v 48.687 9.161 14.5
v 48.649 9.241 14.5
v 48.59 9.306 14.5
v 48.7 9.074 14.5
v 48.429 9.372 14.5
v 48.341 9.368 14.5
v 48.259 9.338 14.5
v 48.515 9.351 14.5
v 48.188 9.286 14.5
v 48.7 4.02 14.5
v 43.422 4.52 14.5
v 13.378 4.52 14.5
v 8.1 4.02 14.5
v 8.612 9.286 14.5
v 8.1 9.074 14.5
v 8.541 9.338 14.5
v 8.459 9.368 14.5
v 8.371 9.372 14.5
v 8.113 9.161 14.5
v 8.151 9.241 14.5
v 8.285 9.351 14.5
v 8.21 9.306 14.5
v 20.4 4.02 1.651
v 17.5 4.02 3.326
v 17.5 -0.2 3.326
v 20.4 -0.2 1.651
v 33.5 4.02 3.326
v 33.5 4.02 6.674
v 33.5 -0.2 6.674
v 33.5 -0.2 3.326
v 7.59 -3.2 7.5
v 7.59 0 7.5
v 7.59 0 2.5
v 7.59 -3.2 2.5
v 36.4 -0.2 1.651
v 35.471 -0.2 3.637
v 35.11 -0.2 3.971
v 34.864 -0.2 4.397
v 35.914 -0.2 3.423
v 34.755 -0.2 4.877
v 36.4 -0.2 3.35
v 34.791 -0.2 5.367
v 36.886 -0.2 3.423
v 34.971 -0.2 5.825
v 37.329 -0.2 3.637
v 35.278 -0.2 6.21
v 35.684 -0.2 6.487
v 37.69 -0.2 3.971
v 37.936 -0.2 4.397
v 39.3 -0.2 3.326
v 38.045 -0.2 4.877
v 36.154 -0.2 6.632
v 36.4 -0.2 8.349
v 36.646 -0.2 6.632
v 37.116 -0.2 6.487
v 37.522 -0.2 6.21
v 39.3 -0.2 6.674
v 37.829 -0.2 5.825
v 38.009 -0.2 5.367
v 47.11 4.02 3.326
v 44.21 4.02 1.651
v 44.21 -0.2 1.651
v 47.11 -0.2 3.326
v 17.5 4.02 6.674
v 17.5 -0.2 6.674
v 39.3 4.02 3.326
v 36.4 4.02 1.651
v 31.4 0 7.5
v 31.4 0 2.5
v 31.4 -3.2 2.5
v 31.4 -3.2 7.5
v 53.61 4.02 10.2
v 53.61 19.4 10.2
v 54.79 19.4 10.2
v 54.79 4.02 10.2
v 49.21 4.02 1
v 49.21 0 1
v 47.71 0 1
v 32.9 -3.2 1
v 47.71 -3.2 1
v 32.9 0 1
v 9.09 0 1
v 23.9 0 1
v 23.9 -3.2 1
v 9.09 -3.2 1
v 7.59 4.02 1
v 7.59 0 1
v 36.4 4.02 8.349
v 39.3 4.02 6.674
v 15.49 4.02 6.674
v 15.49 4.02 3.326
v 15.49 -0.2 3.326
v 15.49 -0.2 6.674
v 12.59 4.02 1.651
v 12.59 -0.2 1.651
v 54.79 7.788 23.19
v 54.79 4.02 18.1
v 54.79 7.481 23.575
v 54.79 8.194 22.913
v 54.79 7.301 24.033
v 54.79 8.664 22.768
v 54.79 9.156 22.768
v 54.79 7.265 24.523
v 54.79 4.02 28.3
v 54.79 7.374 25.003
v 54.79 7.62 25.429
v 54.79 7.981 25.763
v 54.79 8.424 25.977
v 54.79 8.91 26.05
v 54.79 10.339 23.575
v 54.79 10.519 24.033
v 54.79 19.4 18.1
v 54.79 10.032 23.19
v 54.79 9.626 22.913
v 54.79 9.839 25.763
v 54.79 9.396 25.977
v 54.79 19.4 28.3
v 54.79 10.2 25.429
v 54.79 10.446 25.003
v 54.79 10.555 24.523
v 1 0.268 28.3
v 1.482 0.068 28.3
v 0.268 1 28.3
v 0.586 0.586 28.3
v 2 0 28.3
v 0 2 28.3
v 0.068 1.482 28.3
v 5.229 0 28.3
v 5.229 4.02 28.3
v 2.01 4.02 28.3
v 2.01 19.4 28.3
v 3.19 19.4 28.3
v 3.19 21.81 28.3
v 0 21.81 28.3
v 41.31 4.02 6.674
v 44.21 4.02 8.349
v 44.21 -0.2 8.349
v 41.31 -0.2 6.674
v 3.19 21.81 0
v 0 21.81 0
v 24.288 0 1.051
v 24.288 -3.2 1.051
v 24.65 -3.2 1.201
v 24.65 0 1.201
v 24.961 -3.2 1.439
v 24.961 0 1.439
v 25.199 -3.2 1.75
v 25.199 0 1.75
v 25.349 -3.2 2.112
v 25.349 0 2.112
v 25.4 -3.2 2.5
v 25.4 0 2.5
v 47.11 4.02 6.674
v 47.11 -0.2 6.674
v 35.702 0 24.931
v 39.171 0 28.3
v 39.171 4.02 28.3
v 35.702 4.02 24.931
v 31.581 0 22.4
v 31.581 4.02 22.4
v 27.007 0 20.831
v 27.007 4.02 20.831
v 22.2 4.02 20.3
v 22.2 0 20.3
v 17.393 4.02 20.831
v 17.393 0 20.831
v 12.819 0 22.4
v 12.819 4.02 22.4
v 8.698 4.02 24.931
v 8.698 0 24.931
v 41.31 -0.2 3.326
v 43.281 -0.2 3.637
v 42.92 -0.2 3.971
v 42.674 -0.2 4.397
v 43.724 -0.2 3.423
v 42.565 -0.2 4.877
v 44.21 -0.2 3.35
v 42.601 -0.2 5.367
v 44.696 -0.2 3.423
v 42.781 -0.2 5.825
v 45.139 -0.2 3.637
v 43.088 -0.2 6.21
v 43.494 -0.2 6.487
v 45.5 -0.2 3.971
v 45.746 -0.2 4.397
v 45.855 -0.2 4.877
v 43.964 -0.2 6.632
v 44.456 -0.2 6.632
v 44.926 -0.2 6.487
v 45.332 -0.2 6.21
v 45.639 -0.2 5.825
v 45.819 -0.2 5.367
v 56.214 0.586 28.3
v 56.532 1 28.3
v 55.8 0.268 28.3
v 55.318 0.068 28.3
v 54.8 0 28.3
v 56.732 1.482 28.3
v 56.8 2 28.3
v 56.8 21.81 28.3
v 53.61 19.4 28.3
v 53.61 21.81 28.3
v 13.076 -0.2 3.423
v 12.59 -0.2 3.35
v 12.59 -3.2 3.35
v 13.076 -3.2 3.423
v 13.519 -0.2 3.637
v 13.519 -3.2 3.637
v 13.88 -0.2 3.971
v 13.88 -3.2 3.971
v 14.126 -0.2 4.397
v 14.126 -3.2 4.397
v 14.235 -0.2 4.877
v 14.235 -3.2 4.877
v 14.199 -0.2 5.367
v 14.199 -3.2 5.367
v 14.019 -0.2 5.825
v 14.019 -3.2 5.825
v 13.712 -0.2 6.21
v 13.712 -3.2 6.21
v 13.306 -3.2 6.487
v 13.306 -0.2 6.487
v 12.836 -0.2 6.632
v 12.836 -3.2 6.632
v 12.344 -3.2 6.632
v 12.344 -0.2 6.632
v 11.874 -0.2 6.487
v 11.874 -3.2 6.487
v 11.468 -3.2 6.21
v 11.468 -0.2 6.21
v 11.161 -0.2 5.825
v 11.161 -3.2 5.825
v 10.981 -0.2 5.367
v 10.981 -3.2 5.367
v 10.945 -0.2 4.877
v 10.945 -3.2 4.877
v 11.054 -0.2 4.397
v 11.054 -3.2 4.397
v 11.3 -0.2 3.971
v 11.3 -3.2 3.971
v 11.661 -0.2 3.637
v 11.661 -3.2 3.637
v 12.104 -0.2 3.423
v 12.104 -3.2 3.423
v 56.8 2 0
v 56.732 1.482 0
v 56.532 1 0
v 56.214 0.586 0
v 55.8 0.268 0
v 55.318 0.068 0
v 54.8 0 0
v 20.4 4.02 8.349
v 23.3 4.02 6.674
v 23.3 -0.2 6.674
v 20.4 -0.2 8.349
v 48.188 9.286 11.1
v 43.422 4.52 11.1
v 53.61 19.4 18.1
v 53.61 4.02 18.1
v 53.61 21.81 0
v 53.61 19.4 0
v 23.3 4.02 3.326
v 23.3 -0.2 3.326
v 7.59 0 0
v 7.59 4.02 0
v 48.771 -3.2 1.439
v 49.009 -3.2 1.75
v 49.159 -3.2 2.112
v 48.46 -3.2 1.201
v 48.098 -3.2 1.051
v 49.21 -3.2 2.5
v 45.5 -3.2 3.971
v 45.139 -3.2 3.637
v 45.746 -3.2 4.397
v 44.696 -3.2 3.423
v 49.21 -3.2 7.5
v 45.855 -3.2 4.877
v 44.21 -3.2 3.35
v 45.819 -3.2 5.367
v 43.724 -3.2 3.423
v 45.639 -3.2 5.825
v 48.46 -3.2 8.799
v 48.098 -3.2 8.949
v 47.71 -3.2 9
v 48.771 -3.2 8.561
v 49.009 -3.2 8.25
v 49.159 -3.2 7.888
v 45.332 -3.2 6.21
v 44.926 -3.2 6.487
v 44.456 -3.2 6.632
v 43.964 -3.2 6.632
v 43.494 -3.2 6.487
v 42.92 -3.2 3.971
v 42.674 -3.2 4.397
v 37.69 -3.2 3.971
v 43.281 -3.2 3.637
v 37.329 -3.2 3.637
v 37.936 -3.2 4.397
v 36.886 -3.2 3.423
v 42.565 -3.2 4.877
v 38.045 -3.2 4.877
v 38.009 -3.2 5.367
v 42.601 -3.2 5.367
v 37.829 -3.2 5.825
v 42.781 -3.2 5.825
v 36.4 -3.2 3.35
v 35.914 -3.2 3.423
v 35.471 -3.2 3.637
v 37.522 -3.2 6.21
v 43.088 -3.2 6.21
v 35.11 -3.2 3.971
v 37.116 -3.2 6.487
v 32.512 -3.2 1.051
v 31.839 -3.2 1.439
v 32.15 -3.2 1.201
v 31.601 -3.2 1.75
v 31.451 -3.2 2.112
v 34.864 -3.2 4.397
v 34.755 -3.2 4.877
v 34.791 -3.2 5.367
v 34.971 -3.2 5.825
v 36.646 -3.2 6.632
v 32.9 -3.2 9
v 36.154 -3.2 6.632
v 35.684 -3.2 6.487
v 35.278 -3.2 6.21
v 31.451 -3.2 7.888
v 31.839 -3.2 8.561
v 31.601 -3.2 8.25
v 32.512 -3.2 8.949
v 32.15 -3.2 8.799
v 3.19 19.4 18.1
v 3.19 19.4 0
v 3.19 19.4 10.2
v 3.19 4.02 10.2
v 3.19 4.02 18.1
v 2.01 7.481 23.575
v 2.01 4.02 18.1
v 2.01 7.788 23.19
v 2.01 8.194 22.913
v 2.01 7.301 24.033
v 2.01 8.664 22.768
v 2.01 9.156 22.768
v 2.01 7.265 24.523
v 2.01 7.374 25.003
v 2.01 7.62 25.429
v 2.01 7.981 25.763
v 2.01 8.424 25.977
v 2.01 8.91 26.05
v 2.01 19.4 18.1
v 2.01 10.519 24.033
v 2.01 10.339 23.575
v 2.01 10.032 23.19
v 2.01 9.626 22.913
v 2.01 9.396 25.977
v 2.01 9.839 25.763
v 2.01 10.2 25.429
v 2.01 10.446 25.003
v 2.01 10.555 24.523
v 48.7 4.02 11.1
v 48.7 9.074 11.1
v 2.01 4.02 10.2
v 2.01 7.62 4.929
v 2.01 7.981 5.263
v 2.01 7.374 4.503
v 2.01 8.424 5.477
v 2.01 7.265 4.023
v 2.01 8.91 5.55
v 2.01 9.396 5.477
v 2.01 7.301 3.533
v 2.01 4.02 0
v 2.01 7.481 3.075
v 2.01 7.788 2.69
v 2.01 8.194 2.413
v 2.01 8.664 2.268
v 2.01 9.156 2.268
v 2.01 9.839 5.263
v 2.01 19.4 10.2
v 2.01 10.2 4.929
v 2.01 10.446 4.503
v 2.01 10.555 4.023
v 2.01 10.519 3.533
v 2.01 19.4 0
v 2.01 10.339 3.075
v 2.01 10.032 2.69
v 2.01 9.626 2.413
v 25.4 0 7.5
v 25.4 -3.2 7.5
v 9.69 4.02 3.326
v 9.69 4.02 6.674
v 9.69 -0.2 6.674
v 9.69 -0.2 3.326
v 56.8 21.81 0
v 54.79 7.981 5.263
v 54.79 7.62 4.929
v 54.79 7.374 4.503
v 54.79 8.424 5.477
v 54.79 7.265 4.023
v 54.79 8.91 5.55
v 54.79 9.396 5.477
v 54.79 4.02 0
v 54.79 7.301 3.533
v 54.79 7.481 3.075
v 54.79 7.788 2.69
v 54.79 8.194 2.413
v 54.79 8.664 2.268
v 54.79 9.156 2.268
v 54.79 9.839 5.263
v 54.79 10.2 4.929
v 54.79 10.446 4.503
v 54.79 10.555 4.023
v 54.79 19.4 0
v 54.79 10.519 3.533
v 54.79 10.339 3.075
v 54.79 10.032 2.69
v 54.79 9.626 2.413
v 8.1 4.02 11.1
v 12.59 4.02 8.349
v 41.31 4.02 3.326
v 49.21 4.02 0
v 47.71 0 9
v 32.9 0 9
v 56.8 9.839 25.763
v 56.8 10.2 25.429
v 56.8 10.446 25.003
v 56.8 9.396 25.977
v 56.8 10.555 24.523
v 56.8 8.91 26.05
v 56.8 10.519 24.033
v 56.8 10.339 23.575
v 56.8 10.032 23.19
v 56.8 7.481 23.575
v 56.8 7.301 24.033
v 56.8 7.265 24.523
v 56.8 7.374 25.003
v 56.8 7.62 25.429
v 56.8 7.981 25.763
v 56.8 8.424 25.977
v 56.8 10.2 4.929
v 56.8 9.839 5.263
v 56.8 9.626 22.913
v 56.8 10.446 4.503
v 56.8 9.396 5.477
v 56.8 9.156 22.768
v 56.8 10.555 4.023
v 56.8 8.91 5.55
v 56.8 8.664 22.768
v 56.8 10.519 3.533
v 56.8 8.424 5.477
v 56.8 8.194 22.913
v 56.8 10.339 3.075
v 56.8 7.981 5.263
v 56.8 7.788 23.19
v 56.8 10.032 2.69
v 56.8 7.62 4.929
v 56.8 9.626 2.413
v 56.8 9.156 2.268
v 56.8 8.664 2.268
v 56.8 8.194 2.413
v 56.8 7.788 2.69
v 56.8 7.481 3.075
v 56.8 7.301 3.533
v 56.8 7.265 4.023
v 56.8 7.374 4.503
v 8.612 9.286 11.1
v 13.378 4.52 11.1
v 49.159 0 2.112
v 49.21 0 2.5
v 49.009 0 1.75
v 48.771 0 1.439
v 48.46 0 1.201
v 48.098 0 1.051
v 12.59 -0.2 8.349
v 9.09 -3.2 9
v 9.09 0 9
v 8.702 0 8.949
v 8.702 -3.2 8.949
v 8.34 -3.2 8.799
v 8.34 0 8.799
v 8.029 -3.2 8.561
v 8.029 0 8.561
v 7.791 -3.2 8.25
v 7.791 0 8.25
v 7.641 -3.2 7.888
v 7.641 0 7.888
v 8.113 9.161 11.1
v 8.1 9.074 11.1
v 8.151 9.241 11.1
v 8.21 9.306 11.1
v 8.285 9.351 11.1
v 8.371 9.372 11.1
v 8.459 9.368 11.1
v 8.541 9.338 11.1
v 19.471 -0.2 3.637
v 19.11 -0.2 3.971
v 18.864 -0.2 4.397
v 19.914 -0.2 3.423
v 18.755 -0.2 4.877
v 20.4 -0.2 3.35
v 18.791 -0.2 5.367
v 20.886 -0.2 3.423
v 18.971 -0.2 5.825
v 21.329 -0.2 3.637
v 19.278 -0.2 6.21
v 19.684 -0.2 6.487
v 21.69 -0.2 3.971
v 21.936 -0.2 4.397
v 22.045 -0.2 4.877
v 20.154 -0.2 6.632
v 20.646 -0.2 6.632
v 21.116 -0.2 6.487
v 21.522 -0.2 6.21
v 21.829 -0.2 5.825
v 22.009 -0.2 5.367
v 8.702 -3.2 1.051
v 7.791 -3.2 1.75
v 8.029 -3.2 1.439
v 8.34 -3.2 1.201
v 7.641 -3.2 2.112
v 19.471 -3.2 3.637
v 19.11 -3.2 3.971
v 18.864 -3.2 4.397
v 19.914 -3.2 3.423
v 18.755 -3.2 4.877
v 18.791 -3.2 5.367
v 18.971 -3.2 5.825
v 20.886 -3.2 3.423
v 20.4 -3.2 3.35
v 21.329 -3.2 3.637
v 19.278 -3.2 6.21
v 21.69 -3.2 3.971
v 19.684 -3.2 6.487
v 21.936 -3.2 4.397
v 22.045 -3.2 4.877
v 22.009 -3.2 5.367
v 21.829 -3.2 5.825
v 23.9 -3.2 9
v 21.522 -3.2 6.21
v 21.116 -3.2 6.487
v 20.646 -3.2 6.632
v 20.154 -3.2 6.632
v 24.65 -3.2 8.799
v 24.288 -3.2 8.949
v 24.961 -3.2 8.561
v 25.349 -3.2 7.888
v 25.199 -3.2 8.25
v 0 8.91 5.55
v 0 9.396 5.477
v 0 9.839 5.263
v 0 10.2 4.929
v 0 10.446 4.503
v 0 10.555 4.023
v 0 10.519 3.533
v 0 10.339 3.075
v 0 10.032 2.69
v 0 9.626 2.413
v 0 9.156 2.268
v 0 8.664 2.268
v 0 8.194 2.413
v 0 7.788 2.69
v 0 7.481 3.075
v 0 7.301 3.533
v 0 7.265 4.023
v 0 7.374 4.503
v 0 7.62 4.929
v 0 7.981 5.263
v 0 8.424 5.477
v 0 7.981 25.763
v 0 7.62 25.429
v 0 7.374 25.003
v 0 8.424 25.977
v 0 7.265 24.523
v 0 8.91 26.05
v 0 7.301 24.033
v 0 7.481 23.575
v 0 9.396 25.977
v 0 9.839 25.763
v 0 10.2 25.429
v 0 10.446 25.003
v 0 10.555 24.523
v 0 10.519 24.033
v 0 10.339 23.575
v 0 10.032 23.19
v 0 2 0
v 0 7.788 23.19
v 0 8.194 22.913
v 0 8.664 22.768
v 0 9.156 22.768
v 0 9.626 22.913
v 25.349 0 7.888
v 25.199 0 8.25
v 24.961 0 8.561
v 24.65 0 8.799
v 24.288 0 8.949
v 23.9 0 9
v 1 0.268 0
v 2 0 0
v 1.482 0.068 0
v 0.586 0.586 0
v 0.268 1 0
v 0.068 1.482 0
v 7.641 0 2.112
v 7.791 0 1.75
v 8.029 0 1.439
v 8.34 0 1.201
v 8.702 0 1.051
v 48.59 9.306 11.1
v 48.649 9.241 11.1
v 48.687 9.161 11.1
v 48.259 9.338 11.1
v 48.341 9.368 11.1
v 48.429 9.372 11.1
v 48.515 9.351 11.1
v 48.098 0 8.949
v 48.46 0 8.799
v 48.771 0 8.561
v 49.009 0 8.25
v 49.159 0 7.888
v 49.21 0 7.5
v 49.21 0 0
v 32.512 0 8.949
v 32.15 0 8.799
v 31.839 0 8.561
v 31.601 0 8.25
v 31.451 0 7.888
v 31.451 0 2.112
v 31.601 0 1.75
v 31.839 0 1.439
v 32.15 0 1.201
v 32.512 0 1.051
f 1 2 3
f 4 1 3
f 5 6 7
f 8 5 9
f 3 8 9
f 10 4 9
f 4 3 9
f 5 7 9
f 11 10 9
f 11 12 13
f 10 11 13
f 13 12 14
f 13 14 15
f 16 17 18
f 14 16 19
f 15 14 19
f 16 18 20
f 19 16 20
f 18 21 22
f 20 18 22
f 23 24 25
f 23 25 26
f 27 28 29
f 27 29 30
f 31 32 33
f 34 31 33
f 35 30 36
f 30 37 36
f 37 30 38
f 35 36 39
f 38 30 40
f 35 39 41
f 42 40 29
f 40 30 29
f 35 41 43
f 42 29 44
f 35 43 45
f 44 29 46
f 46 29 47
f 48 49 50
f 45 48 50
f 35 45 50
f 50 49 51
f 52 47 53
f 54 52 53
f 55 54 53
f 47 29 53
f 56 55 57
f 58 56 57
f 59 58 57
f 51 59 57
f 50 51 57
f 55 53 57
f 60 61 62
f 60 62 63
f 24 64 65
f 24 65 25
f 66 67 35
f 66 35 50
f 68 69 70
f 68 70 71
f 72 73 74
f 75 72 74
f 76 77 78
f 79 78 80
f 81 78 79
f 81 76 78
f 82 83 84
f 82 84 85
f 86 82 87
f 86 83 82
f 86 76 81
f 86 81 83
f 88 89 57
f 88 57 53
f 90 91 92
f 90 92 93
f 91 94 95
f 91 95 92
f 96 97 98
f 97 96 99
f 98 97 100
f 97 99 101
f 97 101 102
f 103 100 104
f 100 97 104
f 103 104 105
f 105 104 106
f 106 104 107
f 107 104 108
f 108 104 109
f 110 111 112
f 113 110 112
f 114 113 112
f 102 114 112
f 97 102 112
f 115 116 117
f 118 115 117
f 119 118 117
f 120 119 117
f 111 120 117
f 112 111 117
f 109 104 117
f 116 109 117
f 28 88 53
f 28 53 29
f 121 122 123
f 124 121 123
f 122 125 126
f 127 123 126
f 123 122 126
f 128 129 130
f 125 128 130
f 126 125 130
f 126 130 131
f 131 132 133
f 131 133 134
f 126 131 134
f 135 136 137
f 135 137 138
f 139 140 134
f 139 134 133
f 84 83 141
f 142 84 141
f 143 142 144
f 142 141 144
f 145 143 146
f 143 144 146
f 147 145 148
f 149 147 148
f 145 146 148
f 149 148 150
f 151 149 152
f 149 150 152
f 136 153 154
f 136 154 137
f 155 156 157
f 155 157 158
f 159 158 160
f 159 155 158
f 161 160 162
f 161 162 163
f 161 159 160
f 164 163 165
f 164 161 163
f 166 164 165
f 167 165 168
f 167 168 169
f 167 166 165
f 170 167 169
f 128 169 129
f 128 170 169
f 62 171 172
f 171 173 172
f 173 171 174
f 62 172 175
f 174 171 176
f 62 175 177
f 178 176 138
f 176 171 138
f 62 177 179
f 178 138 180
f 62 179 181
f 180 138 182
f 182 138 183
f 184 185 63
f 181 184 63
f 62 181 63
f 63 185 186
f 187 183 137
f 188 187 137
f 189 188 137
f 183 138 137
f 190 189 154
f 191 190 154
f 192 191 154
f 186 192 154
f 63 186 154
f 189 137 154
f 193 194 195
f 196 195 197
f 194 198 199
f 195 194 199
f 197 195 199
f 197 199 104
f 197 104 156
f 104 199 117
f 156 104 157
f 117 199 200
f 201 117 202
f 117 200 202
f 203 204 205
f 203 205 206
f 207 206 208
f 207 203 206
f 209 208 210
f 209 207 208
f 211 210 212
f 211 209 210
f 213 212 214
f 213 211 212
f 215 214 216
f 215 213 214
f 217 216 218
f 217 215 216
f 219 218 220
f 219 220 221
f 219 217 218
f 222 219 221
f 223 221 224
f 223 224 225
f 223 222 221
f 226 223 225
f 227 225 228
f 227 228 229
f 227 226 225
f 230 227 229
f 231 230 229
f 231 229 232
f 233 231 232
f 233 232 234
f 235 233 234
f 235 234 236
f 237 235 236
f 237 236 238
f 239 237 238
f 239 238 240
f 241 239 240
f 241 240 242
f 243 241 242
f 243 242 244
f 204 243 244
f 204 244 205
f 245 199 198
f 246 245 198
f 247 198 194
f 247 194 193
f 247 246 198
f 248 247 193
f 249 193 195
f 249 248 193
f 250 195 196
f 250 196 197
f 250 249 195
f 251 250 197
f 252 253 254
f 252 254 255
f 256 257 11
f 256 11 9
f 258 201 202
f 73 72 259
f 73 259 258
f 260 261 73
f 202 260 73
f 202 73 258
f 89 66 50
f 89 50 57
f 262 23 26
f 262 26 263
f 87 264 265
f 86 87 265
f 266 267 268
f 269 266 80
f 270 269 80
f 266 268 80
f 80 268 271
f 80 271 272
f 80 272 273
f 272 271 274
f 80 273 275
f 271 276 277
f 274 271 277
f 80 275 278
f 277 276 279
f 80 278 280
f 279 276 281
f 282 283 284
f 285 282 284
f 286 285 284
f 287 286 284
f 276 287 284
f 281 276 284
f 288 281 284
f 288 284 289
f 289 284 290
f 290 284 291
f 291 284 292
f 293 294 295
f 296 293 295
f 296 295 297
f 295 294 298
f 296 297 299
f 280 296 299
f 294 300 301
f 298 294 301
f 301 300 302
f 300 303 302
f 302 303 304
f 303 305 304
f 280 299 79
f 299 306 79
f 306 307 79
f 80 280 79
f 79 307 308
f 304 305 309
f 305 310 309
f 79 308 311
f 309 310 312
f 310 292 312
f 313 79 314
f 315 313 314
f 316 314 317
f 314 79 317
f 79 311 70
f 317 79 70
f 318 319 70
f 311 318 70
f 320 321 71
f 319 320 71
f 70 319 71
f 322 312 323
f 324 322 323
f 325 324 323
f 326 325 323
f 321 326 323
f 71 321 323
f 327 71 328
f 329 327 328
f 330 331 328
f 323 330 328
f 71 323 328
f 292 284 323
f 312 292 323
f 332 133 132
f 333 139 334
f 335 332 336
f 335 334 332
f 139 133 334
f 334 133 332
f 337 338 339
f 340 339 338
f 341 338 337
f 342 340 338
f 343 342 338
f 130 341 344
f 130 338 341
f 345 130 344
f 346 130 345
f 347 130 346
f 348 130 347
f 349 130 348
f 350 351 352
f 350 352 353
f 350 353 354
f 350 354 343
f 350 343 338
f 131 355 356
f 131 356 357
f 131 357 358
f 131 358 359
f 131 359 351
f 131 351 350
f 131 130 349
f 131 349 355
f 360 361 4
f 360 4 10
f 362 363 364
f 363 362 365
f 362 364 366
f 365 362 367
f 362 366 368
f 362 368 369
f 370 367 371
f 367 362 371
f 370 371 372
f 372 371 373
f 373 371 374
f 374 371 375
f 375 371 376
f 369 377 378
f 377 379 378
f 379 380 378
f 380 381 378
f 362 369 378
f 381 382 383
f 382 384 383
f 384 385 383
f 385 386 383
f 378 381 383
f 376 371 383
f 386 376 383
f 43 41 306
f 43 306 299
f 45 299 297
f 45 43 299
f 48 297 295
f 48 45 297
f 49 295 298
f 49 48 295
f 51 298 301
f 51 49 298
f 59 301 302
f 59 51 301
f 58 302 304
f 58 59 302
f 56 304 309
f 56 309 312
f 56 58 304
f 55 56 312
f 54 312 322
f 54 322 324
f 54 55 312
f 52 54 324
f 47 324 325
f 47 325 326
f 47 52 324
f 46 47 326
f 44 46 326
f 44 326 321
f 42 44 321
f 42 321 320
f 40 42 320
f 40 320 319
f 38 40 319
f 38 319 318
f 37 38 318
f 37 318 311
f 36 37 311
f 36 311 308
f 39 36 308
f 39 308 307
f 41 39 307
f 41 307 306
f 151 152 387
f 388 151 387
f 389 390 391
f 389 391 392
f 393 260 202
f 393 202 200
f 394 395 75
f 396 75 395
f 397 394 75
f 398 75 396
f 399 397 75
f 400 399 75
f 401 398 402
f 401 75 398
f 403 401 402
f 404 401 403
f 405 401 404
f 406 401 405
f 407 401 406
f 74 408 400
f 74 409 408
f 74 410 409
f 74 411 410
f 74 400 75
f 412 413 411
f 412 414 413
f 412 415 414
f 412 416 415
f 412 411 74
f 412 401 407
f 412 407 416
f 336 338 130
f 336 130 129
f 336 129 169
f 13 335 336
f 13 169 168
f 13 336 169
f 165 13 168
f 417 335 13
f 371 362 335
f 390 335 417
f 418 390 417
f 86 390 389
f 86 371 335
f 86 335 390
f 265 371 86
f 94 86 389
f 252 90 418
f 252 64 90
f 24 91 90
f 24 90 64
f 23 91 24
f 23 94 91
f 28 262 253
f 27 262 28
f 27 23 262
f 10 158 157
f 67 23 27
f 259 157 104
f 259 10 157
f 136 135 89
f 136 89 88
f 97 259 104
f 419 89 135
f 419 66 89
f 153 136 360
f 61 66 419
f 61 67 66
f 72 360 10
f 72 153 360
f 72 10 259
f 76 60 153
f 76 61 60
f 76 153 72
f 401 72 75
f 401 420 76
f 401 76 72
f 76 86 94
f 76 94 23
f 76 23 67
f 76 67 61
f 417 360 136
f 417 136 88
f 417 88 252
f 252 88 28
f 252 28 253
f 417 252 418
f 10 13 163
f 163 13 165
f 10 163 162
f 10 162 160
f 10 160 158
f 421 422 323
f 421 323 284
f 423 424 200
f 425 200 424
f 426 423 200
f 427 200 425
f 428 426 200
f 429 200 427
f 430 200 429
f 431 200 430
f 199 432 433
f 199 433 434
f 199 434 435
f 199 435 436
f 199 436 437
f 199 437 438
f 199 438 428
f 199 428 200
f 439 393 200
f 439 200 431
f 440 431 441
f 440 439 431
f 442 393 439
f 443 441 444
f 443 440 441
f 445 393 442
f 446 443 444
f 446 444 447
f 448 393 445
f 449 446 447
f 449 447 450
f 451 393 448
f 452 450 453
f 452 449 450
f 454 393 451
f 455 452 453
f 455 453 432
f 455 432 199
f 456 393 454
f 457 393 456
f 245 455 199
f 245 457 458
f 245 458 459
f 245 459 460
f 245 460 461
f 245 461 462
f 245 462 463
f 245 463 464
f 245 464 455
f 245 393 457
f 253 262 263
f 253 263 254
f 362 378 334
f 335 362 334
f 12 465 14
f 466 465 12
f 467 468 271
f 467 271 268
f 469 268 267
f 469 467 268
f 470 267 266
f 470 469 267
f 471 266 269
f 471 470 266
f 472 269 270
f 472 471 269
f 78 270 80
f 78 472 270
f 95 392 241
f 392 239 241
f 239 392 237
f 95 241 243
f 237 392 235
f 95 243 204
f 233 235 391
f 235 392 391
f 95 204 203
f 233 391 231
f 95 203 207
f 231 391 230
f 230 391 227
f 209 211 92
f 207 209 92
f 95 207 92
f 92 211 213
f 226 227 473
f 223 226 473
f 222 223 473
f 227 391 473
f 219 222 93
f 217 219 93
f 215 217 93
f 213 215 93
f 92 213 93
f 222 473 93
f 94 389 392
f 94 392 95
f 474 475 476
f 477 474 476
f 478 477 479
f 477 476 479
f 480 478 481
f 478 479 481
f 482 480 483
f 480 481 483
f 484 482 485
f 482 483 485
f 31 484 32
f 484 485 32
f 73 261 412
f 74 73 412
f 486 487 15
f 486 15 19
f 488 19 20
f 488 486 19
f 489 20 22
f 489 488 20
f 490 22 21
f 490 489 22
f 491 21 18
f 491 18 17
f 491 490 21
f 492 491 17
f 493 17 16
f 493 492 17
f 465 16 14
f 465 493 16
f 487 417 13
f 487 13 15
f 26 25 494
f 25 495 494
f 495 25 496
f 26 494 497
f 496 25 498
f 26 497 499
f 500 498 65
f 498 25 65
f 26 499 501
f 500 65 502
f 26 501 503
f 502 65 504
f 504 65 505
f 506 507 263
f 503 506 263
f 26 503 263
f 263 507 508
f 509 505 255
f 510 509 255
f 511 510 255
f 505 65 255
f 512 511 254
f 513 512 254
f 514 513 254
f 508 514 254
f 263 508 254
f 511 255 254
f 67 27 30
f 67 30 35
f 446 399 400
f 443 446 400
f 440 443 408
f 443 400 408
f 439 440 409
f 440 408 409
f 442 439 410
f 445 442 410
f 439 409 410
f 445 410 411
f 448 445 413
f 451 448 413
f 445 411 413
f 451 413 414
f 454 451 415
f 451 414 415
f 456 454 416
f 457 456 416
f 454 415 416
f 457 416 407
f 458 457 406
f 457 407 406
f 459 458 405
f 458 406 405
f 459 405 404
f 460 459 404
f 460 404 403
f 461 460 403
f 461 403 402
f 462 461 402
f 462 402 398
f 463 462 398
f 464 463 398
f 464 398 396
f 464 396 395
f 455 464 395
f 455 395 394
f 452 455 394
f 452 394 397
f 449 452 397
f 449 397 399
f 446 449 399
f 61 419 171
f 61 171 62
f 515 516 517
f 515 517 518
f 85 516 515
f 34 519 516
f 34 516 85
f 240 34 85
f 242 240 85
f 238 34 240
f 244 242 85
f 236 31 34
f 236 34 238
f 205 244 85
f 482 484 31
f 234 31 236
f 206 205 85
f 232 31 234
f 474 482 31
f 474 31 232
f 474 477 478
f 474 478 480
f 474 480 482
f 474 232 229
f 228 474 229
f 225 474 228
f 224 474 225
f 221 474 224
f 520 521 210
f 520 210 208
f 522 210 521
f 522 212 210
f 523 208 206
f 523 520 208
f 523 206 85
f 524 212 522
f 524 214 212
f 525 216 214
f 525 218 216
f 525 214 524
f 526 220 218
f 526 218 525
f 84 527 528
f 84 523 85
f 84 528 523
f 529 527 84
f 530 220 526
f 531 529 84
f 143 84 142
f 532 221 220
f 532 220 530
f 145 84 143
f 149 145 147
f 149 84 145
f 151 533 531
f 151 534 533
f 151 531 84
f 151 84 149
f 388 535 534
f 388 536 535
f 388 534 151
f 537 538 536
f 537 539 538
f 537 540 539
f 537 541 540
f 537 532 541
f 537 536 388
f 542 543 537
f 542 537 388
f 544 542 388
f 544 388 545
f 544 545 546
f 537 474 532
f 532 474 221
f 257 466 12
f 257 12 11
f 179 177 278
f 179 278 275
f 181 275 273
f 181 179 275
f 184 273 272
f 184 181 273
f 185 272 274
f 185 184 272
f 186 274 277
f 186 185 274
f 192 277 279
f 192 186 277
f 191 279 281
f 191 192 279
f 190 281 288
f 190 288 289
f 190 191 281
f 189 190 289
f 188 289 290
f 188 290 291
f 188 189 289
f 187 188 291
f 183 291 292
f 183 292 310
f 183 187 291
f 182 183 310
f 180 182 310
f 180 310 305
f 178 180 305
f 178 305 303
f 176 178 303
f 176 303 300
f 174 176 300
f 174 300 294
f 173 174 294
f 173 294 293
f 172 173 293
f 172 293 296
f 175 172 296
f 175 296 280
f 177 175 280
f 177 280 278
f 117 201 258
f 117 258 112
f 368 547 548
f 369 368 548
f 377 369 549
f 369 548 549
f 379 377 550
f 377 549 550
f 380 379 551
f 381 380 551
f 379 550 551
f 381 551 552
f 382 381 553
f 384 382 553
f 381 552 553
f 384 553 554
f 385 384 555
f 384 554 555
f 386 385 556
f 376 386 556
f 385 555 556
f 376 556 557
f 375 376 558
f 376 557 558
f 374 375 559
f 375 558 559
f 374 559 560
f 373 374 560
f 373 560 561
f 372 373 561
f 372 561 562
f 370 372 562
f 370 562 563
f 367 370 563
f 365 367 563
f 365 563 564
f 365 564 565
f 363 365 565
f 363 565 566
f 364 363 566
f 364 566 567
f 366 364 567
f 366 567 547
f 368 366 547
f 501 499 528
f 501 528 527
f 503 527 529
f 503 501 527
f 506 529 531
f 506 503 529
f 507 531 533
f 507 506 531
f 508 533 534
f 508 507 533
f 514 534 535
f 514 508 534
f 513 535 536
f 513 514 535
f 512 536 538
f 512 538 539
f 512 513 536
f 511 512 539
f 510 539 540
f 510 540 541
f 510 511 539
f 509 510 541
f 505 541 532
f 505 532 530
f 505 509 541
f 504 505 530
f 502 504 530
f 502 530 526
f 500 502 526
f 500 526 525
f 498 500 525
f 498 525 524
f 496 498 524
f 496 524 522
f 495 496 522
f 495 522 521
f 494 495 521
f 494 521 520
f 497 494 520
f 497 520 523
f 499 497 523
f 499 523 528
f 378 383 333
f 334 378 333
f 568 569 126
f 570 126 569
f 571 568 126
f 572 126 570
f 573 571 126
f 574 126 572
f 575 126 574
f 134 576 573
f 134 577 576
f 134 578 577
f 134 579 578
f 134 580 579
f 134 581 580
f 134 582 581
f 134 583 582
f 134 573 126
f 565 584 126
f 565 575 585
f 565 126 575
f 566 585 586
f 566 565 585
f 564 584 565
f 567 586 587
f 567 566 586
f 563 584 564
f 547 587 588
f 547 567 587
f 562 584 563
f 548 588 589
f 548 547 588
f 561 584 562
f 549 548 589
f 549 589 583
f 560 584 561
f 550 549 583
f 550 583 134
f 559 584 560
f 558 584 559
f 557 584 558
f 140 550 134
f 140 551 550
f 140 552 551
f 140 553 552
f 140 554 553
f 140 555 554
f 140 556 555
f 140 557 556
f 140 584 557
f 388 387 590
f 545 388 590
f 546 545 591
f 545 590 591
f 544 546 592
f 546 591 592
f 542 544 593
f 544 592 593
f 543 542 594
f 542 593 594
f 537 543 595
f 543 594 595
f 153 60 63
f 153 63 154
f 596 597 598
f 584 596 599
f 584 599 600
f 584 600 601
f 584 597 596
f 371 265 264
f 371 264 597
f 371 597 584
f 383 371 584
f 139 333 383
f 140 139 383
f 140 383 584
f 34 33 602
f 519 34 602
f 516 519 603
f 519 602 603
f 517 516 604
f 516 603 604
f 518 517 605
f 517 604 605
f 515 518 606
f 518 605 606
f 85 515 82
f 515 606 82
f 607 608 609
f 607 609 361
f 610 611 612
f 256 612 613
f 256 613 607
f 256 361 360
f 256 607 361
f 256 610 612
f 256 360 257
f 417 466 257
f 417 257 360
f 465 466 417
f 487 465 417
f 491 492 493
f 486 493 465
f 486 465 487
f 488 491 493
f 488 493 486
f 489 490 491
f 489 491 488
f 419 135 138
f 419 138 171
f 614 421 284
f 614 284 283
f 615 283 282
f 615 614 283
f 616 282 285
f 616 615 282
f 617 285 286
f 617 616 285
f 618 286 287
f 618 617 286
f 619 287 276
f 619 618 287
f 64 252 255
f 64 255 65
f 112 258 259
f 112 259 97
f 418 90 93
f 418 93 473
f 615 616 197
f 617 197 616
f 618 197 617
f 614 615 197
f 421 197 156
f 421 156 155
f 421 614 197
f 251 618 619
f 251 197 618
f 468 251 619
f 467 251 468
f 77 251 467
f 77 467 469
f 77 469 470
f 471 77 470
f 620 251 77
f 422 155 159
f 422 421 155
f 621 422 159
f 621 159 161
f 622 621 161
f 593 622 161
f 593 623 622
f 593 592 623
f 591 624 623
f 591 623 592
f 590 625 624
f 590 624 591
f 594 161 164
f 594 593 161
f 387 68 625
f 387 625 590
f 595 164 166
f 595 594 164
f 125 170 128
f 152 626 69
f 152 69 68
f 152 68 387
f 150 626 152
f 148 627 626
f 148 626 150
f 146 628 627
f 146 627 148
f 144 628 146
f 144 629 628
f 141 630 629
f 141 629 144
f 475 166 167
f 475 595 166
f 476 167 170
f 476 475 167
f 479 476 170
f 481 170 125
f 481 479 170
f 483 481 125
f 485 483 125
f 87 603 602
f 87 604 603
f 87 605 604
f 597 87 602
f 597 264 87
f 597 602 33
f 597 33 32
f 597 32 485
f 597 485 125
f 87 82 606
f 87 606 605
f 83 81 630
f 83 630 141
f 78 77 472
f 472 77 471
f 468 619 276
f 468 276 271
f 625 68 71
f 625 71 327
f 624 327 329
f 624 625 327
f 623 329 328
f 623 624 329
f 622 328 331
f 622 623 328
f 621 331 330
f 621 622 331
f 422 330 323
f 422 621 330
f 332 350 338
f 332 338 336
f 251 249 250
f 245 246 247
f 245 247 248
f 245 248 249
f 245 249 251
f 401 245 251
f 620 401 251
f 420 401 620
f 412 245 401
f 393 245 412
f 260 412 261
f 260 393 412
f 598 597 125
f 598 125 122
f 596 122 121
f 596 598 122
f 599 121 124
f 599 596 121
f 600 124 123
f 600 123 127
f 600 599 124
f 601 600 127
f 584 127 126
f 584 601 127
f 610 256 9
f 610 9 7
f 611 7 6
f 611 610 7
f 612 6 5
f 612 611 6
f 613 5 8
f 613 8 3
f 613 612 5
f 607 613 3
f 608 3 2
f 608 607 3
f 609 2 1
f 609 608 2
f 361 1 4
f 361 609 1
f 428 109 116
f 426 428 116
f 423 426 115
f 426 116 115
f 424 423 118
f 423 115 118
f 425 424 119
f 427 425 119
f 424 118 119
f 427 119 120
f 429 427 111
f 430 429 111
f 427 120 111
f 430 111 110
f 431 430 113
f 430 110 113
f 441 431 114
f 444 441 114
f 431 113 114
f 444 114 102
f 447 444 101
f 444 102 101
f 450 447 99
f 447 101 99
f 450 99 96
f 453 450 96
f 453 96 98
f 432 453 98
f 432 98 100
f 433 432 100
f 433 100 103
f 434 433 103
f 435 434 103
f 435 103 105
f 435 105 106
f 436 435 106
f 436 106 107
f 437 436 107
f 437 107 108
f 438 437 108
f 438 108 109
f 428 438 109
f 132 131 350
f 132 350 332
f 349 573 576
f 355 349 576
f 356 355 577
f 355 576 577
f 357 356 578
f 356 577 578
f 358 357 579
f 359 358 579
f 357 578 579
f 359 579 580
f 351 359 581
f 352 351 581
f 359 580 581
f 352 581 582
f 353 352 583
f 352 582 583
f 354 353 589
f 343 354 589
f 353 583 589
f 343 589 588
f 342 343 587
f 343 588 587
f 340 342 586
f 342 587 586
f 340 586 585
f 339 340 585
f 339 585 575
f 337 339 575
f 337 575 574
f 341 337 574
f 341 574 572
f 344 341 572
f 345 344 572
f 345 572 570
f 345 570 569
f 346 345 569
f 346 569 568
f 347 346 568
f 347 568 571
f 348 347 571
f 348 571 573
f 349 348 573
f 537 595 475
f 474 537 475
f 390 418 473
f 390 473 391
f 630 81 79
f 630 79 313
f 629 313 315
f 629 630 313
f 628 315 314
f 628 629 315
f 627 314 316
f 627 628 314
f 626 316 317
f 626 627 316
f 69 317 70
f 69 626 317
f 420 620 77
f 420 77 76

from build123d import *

# Parameters (mm, degrees)
BOSS_EXTRUDE1_DEPTH = 28.3
SKETCH2_W           = 52.78
SKETCH2_H           = 15.38
CUT_EXTRUDE1_DEPTH  = 10.2
CUT_EXTRUDE2_START  = 28.3
SKETCH2_2_W         = 52.78
SKETCH2_2_H         = 15.38
CUT_EXTRUDE2_DEPTH  = 10.2
CUT_EXTRUDE3_REACH  = 69.103
SKETCH3_R           = 1.65
BOSS_EXTRUDE2_START = 11.1
BOSS_EXTRUDE2_DEPTH = 3.4
CUT_EXTRUDE4_DEPTH  = 4.02
SKETCH6_R           = 1.65
BOSS_EXTRUDE3_DEPTH = 3.2
CUT_EXTRUDE5_DEPTH  = 4.22
SKETCH10_W          = 41.62
SKETCH10_H          = 8.42
CUT_EXTRUDE6_DEPTH  = 1


with BuildPart() as part:
    # Sketch1 → Boss-Extrude1 (new body)
    with BuildSketch(Plane.XY):
        with BuildLine():
            Line((0, 21.81), (3.19, 21.81))
            Line((3.19, 21.81), (3.19, 4.02))
            Line((3.19, 4.02), (53.61, 4.02))
            Line((53.61, 4.02), (53.61, 21.81))
            Line((53.61, 21.81), (56.8, 21.81))
            Line((56.8, 21.81), (56.8, 2))
            ThreePointArc((56.8, 2), (56.214213562, 0.585786438), (54.8, 0))
            Line((54.8, 0), (2, 0))
            ThreePointArc((2, 0), (0.585786438, 0.585786438), (0, 2))
            Line((0, 2), (0, 21.81))
        make_face()
    extrude(amount=BOSS_EXTRUDE1_DEPTH)

    # Sketch2 → Cut-Extrude1 (cut)
    with BuildSketch(Plane.XY):
        with Locations((28.4, 11.71)):
            Rectangle(SKETCH2_W, SKETCH2_H)
    extrude(amount=CUT_EXTRUDE1_DEPTH, mode=Mode.SUBTRACT)

    # Sketch2<2> → Cut-Extrude2 (cut)
    with BuildSketch(Plane.XY.offset(CUT_EXTRUDE2_START)):
        with Locations((28.4, 11.71)):
            Rectangle(SKETCH2_2_W, SKETCH2_2_H)
    extrude(amount=-CUT_EXTRUDE2_DEPTH, mode=Mode.SUBTRACT)

    # Cut-Extrude3: up to this face of the body (flat: up to its plane)
    cut_extrude3_end = Plane(part.part.faces().sort_by_distance((56.8, 11.905, 14.15))[0])
    # Sketch3 → Cut-Extrude3 (cut, up to the picked face)
    with BuildSketch(Plane.ZY, mode=Mode.PRIVATE) as cut_extrude3_sk1:
        with Locations((3.9, 8.91)):
            Circle(SKETCH3_R)
    cut_extrude3_tool1 = split(extrude(cut_extrude3_sk1.sketch, amount=-CUT_EXTRUDE3_REACH, mode=Mode.PRIVATE), bisect_by=cut_extrude3_end, keep=Keep.BOTH, mode=Mode.PRIVATE)
    # Sketch3 → Cut-Extrude3 (cut, up to the picked face)
    with BuildSketch(Plane.ZY, mode=Mode.PRIVATE) as cut_extrude3_sk2:
        with Locations((24.4, 8.91)):
            Circle(SKETCH3_R)
    cut_extrude3_tool2 = split(extrude(cut_extrude3_sk2.sketch, amount=-CUT_EXTRUDE3_REACH, mode=Mode.PRIVATE), bisect_by=cut_extrude3_end, keep=Keep.BOTH, mode=Mode.PRIVATE)
    add(cut_extrude3_tool1.solids().sort_by(Axis((0, 8.91, 3.9), (1, 0, 0)))[0], mode=Mode.SUBTRACT)
    add(cut_extrude3_tool2.solids().sort_by(Axis((0, 8.91, 24.4), (1, 0, 0)))[0], mode=Mode.SUBTRACT)

    # Sketch4 → Boss-Extrude2 (add)
    with BuildSketch(Plane.XY.offset(BOSS_EXTRUDE2_START)):
        with BuildLine():
            Line((8.612132034, 9.286042559), (13.378174593, 4.52))
            Line((13.378174593, 4.52), (43.421825407, 4.52))
            Line((43.421825407, 4.52), (48.187867966, 9.286042559))
            ThreePointArc((48.187867966, 9.286042559), (48.51480503, 9.351074384), (48.7, 9.073910524))
            Line((48.7, 9.073910524), (48.7, 4.02))
            Line((48.7, 4.02), (8.1, 4.02))
            Line((8.1, 4.02), (8.1, 9.073910524))
            ThreePointArc((8.1, 9.073910524), (8.28519497, 9.351074384), (8.612132034, 9.286042559))
        make_face()
    extrude(amount=BOSS_EXTRUDE2_DEPTH)

    # Sketch5 → Cut-Extrude4 (cut)
    with BuildSketch(Plane.XZ):
        with BuildLine():
            Line((5.229437252, 28.3), (39.170562748, 28.3))
            ThreePointArc((39.170562748, 28.3), (22.2, 20.3), (5.229437252, 28.3))
        make_face()
    extrude(amount=-CUT_EXTRUDE4_DEPTH, mode=Mode.SUBTRACT)

    # Sketch6 → Boss-Extrude3 (add)
    # profile 1 of 2: a face of its own
    with BuildSketch(Plane.XZ):
        with BuildLine():
            Line((9.09, 1), (23.9, 1))
            ThreePointArc((23.9, 1), (24.960660172, 1.439339828), (25.4, 2.5))
            Line((25.4, 2.5), (25.4, 7.5))
            ThreePointArc((25.4, 7.5), (24.960660172, 8.560660172), (23.9, 9))
            Line((23.9, 9), (9.09, 9))
            ThreePointArc((9.09, 9), (8.029339828, 8.560660172), (7.59, 7.5))
            Line((7.59, 7.5), (7.59, 2.5))
            ThreePointArc((7.59, 2.5), (8.029339828, 1.439339828), (9.09, 1))
        make_face()
        with Locations(Location((20.4, 5, 0), (0, 0, 270))):
            Circle(SKETCH6_R, mode=Mode.SUBTRACT)
        with Locations(Location((12.59, 5, 0), (0, 0, 270))):
            Circle(SKETCH6_R, mode=Mode.SUBTRACT)
    # profile 2 of 2: a face of its own
    with BuildSketch(Plane.XZ):
        with BuildLine():
            Line((32.9, 9), (47.71, 9))
            ThreePointArc((47.71, 9), (48.770660172, 8.560660172), (49.21, 7.5))
            Line((49.21, 7.5), (49.21, 2.5))
            ThreePointArc((49.21, 2.5), (48.770660172, 1.439339828), (47.71, 1))
            Line((47.71, 1), (32.9, 1))
            ThreePointArc((32.9, 1), (31.839339828, 1.439339828), (31.4, 2.5))
            Line((31.4, 2.5), (31.4, 7.5))
            ThreePointArc((31.4, 7.5), (31.839339828, 8.560660172), (32.9, 9))
        make_face()
        with Locations(Location((36.4, 5, 0), (0, 0, 270))):
            Circle(SKETCH6_R, mode=Mode.SUBTRACT)
        with Locations(Location((44.21, 5, 0), (0, 0, 270))):
            Circle(SKETCH6_R, mode=Mode.SUBTRACT)
    extrude(amount=BOSS_EXTRUDE3_DEPTH)

    # Sketch8 → Cut-Extrude5 (cut)
    with BuildSketch(Plane.XZ.offset(-4.02)):
        Polygon((23.3, 6.674315781), (20.4, 8.348631561), (17.5, 6.674315781), (17.5, 3.325684219), (20.4, 1.651368439), (23.3, 3.325684219), align=None)
        Polygon((39.3, 6.674315781), (36.4, 8.348631561), (33.5, 6.674315781), (33.5, 3.325684219), (36.4, 1.651368439), (39.3, 3.325684219), align=None)
        Polygon((47.11, 6.674315781), (44.21, 8.348631561), (41.31, 6.674315781), (41.31, 3.325684219), (44.21, 1.651368439), (47.11, 3.325684219), align=None)
        Polygon((15.49, 6.674315781), (12.59, 8.348631561), (9.69, 6.674315781), (9.69, 3.325684219), (12.59, 1.651368439), (15.49, 3.325684219), align=None)
    extrude(amount=CUT_EXTRUDE5_DEPTH, mode=Mode.SUBTRACT)

    # Sketch10 → Cut-Extrude6 (cut)
    with BuildSketch(Plane(origin=(0, 0, 0), x_dir=(-1, 0, 0), z_dir=(0, 0, -1))):
        with Locations((-28.4, -0.19)):
            Rectangle(SKETCH10_W, SKETCH10_H)
    extrude(amount=-CUT_EXTRUDE6_DEPTH, mode=Mode.SUBTRACT)


solid = part.part
